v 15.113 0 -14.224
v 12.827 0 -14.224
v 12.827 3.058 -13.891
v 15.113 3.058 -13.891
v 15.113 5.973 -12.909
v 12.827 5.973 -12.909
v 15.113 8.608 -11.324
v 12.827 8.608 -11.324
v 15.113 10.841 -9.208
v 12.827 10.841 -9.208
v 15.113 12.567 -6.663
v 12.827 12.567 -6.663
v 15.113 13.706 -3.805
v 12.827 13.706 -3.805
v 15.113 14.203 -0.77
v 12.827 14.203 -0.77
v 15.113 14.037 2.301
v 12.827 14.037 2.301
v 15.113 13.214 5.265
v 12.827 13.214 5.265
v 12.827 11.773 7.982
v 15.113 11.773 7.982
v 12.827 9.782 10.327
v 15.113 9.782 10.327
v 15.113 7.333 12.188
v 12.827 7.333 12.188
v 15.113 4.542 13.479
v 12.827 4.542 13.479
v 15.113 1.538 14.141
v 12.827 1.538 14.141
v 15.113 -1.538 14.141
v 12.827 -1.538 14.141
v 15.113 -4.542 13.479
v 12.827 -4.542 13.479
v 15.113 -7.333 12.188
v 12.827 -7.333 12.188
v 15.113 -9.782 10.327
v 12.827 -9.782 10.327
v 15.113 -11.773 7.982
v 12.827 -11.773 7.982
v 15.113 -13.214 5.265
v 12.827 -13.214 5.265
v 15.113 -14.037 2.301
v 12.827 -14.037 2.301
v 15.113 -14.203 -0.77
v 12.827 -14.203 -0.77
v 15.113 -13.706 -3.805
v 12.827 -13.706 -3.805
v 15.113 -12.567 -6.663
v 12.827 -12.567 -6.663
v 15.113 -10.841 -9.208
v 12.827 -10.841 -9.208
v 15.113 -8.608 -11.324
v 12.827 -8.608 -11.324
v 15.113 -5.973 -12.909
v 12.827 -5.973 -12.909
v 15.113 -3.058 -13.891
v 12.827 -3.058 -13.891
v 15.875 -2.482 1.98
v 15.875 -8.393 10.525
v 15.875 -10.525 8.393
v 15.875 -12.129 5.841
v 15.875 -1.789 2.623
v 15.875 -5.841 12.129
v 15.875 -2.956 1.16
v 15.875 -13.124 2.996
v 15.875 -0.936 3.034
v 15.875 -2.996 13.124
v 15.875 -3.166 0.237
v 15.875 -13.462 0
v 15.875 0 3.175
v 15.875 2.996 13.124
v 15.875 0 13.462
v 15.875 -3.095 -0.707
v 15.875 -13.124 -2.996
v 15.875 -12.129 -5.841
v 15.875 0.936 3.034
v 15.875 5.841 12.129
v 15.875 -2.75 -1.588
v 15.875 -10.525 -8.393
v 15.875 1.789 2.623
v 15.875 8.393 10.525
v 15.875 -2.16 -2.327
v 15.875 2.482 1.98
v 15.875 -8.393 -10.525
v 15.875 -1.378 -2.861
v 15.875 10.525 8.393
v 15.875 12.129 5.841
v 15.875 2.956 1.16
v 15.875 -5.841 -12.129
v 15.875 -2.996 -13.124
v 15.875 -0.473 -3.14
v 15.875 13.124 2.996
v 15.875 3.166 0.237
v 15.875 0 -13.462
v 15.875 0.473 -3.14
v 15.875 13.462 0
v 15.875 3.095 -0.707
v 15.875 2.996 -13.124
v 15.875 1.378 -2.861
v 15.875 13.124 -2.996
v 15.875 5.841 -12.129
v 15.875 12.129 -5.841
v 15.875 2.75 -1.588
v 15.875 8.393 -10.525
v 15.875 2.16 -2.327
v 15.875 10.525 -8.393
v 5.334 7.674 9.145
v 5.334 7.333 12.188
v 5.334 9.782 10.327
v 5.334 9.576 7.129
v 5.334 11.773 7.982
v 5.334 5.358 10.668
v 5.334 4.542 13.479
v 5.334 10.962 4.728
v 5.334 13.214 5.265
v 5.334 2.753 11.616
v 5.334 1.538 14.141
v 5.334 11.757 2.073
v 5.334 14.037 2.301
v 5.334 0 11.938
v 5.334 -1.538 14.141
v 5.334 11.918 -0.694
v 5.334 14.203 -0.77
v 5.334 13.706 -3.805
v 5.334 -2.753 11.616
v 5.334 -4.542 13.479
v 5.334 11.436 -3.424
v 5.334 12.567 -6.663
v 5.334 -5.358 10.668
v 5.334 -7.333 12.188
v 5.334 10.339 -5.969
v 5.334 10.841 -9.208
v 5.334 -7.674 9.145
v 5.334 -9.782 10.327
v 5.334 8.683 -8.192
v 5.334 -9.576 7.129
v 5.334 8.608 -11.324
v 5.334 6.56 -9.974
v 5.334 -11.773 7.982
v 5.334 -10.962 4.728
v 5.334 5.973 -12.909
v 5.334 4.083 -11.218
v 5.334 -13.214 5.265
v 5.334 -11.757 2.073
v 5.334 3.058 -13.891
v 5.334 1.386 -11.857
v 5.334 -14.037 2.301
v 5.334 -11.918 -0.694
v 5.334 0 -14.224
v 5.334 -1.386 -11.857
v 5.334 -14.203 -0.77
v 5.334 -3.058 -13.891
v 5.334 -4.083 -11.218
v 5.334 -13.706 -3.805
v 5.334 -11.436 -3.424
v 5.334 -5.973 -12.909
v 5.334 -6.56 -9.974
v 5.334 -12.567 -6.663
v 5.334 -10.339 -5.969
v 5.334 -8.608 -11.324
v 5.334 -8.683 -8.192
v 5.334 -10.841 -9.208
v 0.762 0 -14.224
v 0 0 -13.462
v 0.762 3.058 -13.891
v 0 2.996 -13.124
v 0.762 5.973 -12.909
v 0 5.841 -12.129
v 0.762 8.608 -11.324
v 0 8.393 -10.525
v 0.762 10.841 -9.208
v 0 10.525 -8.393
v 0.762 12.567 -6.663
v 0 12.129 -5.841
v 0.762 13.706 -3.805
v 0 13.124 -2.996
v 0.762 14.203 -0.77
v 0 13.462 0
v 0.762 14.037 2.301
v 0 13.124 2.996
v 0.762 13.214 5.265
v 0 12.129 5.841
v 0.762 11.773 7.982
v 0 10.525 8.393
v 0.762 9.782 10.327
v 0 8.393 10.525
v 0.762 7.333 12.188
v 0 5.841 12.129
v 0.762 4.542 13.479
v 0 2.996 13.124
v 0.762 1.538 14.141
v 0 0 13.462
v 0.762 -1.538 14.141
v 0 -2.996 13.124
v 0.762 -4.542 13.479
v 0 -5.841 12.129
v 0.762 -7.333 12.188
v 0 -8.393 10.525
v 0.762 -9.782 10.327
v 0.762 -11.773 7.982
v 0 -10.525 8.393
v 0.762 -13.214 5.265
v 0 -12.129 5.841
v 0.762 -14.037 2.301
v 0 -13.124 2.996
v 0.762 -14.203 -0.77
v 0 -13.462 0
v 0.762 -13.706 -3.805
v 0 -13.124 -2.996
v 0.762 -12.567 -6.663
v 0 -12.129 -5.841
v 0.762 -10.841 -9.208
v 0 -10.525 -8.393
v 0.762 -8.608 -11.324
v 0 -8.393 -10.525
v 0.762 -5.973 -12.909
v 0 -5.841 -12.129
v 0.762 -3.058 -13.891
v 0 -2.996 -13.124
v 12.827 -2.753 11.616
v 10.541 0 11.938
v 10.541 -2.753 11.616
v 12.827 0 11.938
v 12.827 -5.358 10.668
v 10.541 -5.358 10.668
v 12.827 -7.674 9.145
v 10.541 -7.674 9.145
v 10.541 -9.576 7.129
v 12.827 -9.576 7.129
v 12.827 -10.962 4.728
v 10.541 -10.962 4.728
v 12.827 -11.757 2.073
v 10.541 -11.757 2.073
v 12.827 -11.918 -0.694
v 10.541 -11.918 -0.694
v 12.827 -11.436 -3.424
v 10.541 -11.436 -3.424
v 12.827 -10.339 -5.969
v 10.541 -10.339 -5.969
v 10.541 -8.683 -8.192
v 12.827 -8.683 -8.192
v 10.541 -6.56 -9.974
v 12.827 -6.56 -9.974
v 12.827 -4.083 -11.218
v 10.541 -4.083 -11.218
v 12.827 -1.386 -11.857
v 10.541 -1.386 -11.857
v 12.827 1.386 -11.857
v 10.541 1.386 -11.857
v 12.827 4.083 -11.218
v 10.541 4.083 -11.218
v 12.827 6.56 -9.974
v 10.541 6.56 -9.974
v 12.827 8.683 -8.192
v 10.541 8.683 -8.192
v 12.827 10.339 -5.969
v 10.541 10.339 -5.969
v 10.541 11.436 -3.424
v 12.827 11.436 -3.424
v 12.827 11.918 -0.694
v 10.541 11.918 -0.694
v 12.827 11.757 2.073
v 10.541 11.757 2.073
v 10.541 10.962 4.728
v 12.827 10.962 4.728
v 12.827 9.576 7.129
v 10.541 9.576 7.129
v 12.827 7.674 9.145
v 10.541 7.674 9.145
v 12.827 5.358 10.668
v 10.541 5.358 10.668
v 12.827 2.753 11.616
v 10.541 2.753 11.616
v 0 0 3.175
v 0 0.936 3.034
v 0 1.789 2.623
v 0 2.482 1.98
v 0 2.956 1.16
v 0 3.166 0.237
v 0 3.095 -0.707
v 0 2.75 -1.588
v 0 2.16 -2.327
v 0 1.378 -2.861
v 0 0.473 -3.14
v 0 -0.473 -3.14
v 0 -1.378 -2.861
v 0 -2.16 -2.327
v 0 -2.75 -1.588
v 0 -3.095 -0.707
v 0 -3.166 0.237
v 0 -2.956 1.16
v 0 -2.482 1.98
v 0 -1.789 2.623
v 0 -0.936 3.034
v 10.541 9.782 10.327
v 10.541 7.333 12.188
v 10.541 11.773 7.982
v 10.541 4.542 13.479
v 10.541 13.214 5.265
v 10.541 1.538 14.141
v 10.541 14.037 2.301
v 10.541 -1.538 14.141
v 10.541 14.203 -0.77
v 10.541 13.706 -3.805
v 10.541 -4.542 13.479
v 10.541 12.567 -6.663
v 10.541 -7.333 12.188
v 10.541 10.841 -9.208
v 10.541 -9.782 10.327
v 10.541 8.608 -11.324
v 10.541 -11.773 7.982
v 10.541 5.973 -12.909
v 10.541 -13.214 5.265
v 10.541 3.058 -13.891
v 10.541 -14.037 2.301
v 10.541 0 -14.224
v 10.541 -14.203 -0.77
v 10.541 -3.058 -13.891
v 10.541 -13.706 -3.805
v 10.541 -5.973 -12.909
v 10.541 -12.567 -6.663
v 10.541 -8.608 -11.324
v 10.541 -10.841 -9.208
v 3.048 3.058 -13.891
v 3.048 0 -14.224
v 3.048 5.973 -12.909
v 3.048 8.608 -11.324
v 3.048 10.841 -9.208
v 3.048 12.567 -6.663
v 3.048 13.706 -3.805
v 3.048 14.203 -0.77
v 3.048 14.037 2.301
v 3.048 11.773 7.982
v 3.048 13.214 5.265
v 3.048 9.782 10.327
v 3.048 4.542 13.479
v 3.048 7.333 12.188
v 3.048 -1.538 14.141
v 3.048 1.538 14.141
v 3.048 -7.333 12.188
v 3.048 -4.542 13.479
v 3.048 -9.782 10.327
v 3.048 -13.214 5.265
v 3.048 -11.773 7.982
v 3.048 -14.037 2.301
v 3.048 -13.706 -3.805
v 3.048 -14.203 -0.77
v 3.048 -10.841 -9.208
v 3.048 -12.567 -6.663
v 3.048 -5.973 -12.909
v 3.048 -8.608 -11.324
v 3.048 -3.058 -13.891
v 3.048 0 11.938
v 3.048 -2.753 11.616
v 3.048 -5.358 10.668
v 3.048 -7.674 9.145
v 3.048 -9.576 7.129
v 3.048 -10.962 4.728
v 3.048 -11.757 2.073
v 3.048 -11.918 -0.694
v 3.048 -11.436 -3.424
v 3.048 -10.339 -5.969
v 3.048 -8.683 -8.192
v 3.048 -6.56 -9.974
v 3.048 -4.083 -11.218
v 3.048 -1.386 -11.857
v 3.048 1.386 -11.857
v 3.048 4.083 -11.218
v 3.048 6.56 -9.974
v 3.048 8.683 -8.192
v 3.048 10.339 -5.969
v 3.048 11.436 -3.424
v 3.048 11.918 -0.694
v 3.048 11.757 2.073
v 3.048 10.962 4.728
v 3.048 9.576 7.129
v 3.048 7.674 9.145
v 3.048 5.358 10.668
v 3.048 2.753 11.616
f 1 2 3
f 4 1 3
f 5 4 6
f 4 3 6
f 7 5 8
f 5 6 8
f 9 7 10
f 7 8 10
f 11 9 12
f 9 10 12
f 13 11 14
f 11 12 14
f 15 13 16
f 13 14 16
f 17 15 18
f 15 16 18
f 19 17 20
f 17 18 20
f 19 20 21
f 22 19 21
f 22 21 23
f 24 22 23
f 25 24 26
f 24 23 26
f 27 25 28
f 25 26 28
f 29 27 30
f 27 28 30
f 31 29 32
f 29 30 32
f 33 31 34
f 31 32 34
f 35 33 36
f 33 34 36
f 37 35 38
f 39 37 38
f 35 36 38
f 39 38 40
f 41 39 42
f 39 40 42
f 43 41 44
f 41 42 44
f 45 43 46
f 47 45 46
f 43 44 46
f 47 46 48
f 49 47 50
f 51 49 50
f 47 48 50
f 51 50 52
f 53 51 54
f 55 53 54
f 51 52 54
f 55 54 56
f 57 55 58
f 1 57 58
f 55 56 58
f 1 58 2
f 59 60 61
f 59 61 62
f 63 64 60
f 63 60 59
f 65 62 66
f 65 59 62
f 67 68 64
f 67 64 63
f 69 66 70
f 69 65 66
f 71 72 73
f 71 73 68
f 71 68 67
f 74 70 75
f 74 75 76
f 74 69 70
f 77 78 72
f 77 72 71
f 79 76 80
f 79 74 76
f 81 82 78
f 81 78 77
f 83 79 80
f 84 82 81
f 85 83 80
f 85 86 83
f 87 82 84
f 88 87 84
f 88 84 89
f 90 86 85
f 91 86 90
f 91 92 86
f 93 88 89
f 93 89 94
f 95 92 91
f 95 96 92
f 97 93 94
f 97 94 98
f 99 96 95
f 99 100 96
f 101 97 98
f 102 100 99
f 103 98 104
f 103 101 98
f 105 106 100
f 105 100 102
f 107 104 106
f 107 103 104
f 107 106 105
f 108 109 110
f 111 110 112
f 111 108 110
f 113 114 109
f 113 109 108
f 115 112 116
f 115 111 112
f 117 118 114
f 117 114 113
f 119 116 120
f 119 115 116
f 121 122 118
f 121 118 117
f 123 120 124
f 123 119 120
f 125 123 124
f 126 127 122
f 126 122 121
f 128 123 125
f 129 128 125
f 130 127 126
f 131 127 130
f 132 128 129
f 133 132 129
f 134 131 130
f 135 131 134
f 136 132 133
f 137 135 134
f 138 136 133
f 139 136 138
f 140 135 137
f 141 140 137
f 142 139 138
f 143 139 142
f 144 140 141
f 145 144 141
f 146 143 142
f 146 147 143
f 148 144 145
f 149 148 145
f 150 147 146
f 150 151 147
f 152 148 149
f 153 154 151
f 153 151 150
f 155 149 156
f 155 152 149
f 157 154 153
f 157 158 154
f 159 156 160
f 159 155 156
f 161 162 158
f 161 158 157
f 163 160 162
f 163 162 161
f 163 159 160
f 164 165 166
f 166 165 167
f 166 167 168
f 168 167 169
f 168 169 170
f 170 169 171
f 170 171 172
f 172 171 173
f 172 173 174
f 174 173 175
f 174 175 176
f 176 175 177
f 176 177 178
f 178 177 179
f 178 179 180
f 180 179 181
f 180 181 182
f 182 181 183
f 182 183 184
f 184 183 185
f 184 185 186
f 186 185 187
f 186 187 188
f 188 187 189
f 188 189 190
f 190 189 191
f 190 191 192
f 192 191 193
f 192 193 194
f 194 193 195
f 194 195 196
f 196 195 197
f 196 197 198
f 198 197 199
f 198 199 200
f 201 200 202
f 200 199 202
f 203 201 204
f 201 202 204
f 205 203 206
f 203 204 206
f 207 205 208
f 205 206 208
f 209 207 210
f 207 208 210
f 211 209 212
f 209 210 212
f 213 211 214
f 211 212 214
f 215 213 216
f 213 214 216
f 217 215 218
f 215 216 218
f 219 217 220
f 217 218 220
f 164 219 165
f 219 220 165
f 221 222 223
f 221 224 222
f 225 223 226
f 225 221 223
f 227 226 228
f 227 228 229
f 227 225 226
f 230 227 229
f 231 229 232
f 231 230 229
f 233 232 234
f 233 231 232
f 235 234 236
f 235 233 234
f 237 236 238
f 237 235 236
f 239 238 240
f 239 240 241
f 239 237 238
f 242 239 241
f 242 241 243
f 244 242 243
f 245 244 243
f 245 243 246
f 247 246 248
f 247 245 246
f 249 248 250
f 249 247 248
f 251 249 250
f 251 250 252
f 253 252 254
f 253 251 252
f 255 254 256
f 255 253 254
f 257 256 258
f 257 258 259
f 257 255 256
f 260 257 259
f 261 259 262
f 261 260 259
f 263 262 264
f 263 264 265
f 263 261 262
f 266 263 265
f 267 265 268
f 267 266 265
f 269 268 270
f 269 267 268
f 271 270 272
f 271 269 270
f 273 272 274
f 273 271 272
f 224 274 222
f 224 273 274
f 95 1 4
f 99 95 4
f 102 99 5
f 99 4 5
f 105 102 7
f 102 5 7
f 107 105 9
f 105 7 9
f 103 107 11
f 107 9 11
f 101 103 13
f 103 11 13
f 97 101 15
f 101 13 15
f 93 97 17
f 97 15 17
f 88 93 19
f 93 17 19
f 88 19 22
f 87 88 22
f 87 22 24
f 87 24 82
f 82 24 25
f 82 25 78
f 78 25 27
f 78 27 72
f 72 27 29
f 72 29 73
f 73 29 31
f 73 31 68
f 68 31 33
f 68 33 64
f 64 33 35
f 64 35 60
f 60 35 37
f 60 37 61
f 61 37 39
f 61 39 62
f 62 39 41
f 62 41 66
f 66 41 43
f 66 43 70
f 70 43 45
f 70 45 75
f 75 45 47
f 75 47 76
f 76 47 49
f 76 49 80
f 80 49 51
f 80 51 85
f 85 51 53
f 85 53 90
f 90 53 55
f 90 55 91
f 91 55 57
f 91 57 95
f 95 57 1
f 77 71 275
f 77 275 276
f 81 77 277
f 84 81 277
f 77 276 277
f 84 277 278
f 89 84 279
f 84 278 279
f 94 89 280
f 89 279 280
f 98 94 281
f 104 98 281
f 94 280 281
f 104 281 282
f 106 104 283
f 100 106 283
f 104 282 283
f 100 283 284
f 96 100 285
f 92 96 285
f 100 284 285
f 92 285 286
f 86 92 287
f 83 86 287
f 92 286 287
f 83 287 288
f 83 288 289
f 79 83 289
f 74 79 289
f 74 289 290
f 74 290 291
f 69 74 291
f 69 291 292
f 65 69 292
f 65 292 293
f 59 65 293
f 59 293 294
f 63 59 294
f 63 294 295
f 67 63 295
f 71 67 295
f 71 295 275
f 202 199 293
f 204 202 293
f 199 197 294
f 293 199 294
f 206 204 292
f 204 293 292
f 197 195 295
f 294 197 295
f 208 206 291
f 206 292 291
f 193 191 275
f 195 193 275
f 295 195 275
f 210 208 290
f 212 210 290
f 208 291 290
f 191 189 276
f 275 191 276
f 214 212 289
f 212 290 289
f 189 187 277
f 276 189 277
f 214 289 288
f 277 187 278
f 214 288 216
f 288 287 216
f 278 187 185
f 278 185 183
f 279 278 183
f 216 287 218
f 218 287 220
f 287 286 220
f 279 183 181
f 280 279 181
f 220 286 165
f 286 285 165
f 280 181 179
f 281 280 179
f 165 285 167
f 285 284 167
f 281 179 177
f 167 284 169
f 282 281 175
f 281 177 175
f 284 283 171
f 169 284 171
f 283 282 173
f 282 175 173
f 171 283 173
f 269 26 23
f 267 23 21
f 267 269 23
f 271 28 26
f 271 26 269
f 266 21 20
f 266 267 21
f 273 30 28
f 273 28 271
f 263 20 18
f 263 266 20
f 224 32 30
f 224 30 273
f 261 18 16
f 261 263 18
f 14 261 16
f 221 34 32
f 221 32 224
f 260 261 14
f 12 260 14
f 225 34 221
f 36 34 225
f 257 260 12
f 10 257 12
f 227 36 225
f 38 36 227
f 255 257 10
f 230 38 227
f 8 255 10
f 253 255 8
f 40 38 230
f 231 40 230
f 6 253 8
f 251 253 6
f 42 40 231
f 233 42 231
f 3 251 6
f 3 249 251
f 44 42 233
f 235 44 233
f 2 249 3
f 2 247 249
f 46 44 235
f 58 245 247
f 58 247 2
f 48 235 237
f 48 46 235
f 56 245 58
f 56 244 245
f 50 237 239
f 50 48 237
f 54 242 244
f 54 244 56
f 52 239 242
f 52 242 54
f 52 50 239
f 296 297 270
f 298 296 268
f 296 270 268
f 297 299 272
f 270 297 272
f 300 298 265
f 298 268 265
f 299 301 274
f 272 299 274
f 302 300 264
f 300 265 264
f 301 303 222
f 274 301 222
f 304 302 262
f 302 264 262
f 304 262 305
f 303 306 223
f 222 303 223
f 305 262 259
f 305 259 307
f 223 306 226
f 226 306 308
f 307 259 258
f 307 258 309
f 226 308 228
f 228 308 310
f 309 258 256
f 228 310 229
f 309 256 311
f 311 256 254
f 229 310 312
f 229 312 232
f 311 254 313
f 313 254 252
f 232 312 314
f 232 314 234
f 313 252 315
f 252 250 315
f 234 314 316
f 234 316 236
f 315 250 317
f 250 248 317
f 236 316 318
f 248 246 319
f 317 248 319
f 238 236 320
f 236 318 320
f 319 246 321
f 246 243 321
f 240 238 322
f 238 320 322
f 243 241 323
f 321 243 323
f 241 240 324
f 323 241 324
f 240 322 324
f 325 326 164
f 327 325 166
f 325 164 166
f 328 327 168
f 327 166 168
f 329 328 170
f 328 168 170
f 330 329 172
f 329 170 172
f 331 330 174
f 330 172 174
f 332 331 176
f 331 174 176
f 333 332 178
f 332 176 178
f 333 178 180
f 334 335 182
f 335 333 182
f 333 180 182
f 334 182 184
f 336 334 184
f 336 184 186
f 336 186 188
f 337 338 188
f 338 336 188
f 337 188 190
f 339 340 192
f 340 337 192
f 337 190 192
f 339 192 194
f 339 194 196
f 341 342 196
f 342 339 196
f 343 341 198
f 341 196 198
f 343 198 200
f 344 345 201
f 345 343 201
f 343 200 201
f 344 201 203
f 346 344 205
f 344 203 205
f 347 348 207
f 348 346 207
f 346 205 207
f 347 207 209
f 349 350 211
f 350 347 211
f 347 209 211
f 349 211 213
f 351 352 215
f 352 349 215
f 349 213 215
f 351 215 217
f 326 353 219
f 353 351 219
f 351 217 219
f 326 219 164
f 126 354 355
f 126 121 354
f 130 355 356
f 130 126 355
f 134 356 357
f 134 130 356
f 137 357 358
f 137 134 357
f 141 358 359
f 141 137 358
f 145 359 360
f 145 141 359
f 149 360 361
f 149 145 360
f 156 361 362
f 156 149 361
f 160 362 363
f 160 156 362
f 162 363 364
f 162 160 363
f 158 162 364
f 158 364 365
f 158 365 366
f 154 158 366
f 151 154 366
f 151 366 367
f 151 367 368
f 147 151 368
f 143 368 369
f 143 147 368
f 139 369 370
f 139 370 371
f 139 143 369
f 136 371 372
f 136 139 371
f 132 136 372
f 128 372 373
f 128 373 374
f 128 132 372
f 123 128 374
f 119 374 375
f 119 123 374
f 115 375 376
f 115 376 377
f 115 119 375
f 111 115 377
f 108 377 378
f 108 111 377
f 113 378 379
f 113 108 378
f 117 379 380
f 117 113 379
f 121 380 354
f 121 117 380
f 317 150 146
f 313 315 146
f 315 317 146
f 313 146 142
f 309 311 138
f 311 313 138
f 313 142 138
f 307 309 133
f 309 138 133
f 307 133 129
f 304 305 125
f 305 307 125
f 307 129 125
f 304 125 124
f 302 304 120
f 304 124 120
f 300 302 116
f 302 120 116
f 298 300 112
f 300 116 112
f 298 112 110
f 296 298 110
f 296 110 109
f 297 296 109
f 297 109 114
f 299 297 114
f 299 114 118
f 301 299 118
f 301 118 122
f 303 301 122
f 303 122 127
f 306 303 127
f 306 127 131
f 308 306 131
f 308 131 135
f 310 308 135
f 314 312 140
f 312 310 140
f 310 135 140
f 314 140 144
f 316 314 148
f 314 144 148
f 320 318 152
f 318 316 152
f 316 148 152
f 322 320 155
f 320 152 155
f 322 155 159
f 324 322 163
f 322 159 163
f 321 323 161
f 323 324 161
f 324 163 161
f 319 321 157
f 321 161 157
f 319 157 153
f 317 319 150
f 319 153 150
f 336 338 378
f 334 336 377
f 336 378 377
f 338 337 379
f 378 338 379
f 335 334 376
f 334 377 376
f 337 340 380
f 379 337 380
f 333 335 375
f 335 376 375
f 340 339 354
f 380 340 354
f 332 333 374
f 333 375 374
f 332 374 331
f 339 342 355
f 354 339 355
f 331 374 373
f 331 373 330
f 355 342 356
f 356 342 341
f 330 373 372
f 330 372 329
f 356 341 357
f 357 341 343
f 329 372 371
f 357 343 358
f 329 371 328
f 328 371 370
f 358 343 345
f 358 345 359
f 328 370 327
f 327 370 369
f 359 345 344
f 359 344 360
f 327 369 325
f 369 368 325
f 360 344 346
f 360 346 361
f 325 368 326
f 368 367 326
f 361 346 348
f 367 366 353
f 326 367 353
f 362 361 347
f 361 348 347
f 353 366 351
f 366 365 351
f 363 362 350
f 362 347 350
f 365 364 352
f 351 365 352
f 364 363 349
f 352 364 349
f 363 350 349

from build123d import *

# Parameters (mm, degrees)
SKETCH3_R          = 14.224
BASE_EXTRUDE_DEPTH = 15.875
SKETCH4_W          = 2.286
SKETCH4_H          = 2.286
SKETCH5_R          = 3.175
CUT_EXTRUDE1_DEPTH = 26.625377597
CHAMFER1_SIZE      = 0.762


with BuildPart() as part:
    # Sketch3 → Base-Extrude (new body)
    with BuildSketch(Plane(origin=(0, 0, 0), x_dir=(0, 0, -1), z_dir=(1, 0, 0))):
        Circle(SKETCH3_R)
    extrude(amount=BASE_EXTRUDE_DEPTH)

    # Sketch4 → Cut-Revolve1 (revolve, cut)
    with BuildSketch(Plane.XY, mode=Mode.PRIVATE) as cut_revolve1_sk:
        with Locations((4.191, 13.081)):
            Rectangle(SKETCH4_W, SKETCH4_H)
        with Locations((11.684, 13.081)):
            Rectangle(SKETCH4_W, SKETCH4_H)
    revolve(cut_revolve1_sk.sketch.rotate(Axis((0, 0, 0), (1, 0, 0)), 90), axis=Axis((0, 0, 0), (1, 0, 0)), mode=Mode.SUBTRACT)

    # Sketch5 → Cut-Extrude1 (cut, through all)
    with BuildSketch(Plane.ZY):
        Circle(SKETCH5_R)
    extrude(amount=-CUT_EXTRUDE1_DEPTH, mode=Mode.SUBTRACT)

    # Chamfer1
    chamfer1_edges = [part.edges().sort_by_distance(p)[0] for p in [
        (0, 0, 14.224),
        (15.875, 0, 14.224),
    ]]
    chamfer(chamfer1_edges, length=CHAMFER1_SIZE)


solid = part.part
